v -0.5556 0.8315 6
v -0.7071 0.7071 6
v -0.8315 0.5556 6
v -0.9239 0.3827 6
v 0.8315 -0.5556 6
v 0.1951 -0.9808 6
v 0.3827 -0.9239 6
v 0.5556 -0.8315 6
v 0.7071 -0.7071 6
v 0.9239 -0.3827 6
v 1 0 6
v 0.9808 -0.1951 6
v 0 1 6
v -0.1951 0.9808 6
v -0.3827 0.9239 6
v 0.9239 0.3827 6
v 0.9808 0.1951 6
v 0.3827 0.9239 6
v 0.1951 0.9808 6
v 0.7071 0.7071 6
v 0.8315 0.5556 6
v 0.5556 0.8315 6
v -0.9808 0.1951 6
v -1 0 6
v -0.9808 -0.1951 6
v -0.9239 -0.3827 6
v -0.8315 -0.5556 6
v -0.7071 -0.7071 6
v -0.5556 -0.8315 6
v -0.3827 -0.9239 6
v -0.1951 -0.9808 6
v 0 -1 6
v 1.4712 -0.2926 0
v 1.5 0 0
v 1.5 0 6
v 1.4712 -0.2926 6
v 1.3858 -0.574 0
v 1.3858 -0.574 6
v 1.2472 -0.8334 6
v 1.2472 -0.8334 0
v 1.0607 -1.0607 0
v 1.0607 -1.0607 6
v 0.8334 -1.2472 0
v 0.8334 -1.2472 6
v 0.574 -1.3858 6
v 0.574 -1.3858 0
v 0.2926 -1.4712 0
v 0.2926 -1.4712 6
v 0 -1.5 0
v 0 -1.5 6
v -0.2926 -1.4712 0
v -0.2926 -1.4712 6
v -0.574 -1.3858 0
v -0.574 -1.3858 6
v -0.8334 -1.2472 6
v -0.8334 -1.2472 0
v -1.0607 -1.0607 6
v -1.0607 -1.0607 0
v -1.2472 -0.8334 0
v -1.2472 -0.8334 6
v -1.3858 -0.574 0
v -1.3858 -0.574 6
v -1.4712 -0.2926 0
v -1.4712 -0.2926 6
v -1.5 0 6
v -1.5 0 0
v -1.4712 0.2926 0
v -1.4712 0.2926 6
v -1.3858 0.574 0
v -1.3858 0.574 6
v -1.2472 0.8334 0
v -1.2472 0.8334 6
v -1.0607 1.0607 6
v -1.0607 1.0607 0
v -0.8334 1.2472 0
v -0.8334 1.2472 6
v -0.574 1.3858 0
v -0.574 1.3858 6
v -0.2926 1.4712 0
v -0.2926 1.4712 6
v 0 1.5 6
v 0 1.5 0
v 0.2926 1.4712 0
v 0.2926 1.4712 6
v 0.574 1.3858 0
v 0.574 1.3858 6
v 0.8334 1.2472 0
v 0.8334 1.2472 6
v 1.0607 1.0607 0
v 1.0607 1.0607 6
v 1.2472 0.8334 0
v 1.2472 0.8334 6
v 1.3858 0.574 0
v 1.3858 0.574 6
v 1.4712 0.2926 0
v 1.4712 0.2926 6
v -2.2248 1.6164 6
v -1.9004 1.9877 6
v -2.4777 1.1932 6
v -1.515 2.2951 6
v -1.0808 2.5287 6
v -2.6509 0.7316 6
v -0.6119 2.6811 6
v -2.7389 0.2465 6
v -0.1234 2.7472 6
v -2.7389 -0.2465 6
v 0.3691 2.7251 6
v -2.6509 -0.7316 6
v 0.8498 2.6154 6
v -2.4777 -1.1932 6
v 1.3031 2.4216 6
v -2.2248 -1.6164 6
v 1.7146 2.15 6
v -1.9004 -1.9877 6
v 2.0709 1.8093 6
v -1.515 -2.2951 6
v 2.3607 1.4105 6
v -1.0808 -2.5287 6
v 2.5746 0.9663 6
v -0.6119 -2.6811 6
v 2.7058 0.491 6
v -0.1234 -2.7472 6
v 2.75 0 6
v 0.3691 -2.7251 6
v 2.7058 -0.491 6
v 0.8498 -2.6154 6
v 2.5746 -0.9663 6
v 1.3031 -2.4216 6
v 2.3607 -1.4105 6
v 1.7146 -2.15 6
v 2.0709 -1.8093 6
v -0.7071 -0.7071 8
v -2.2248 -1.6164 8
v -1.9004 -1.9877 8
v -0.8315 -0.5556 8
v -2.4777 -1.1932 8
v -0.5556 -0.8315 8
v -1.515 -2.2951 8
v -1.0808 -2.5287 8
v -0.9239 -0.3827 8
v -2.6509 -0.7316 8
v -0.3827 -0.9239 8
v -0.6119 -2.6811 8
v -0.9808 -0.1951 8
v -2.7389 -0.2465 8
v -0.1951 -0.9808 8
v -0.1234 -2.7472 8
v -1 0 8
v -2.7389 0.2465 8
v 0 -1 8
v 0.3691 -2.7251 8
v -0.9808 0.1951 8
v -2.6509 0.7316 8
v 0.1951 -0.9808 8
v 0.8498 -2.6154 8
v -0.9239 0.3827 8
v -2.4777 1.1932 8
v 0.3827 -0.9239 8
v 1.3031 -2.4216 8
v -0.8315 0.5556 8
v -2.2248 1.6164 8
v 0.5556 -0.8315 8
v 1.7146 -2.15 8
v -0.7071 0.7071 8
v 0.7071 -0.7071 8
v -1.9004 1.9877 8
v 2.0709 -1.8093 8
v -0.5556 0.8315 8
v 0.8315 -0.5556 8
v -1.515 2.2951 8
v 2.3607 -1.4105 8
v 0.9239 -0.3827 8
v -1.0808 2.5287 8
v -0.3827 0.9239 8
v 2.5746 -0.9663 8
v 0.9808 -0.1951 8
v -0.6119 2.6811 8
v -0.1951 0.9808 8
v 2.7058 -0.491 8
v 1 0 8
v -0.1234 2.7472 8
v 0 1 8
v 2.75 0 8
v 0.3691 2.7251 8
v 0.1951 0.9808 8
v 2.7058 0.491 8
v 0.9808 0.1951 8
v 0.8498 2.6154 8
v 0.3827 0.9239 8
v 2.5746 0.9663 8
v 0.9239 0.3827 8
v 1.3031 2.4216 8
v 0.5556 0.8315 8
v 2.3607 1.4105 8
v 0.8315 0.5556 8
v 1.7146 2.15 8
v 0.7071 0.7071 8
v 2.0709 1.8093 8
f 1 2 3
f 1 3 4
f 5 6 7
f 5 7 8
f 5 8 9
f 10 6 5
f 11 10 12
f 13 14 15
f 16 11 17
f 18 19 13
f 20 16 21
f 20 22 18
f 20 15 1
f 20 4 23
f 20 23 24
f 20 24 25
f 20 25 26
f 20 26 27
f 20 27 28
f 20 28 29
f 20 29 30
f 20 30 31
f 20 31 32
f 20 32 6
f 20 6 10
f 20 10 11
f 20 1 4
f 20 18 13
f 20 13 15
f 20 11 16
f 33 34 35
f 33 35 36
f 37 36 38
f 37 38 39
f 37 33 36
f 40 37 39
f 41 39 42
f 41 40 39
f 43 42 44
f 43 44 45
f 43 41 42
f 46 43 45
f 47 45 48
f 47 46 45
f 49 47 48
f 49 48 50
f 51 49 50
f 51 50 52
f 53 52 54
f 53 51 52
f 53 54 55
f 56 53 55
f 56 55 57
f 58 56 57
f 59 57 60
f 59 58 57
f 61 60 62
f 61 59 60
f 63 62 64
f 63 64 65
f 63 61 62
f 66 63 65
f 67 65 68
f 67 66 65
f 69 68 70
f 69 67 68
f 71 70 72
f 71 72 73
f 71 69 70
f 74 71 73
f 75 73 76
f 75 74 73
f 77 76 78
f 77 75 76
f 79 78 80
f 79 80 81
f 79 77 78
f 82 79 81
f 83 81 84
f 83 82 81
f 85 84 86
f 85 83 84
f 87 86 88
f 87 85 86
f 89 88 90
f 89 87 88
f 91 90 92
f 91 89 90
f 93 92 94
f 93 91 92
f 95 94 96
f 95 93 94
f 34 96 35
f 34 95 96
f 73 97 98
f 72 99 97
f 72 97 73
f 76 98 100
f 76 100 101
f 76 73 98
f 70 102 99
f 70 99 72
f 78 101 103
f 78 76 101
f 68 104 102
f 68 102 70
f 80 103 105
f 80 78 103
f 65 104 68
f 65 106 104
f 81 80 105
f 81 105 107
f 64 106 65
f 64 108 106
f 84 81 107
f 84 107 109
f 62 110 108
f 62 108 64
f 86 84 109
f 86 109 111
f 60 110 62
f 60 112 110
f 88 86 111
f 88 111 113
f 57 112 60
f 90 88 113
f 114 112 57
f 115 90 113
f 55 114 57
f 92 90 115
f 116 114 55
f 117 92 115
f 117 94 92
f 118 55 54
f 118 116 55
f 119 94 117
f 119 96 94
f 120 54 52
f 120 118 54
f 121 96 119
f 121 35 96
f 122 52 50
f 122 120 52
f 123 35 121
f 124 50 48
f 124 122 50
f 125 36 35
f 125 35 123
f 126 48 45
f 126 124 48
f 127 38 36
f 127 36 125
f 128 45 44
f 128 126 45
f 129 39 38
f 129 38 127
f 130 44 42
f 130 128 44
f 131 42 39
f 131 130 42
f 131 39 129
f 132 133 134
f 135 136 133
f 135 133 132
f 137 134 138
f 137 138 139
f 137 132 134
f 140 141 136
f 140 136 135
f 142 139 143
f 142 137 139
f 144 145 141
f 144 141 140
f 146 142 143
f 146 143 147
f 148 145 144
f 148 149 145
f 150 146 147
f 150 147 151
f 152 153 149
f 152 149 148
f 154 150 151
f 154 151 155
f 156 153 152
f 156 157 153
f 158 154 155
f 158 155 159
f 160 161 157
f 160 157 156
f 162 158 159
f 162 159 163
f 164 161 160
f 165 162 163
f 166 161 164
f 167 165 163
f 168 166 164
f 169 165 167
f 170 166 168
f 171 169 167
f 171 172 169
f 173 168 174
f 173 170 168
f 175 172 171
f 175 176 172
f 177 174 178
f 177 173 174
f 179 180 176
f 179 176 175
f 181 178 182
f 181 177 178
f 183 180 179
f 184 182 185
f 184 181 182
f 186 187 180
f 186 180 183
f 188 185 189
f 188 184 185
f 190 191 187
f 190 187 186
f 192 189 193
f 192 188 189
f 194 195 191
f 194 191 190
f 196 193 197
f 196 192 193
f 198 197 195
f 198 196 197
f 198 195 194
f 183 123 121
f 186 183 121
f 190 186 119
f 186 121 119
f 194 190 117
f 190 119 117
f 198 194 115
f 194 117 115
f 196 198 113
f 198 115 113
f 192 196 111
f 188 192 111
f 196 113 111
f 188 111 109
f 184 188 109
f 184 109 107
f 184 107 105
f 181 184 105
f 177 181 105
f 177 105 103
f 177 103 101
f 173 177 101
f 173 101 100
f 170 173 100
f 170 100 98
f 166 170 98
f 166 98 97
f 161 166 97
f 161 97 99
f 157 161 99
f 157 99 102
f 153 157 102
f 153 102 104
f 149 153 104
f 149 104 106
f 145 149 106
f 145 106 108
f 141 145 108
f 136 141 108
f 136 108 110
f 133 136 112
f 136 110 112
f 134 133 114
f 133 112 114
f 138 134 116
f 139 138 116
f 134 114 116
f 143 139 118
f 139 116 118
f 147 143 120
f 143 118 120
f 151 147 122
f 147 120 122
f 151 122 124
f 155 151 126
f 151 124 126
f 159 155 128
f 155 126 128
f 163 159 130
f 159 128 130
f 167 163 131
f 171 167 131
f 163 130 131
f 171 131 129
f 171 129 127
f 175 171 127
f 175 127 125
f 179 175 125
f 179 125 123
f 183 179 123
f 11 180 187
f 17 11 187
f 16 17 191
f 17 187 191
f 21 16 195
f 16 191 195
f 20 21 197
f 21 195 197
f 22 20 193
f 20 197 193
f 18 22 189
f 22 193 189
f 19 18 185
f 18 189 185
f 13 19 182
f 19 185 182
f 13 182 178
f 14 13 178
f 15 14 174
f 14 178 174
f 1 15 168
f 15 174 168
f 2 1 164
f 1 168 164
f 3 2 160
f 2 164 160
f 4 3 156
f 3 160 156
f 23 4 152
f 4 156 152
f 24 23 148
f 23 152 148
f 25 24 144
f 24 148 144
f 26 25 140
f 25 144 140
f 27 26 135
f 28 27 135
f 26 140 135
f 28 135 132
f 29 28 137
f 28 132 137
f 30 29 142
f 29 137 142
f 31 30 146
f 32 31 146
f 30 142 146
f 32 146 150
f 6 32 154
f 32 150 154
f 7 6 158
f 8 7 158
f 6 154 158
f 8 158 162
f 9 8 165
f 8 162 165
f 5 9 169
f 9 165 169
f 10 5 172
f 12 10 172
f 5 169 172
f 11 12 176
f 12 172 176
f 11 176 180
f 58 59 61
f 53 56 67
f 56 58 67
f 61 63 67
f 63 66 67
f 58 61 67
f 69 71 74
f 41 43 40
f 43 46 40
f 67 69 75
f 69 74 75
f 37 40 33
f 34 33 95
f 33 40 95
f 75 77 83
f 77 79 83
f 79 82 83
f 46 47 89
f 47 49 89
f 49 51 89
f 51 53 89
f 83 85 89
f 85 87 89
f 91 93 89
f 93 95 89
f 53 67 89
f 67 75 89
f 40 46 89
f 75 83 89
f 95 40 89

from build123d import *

# Parameters (mm, degrees)
F0_R     = 2.75
F1_DEPTH = 8
F2_R     = 2.75
F2_R_2   = 1.5
F3_DEPTH = 6
F4_R     = 1
F5_DEPTH = 2


with BuildPart() as f1:
    # F0 (on Top) → F1 (new body)
    with BuildSketch(Plane.XY):
        Circle(F0_R)
    extrude(amount=F1_DEPTH)

    # F2 (on face) → F3 (cut)
    with BuildSketch(Plane(origin=(0, 0, 0), x_dir=(1, 0, 0), z_dir=(0, 0, -1))):
        Circle(F2_R)
        Circle(F2_R_2, mode=Mode.SUBTRACT)
    extrude(amount=-F3_DEPTH, mode=Mode.SUBTRACT)

    # F4 (on face) → F5 (cut)
    with BuildSketch(Plane.XY.offset(8)):
        Circle(F4_R)
    extrude(amount=-F5_DEPTH, mode=Mode.SUBTRACT)


solid = f1.part
